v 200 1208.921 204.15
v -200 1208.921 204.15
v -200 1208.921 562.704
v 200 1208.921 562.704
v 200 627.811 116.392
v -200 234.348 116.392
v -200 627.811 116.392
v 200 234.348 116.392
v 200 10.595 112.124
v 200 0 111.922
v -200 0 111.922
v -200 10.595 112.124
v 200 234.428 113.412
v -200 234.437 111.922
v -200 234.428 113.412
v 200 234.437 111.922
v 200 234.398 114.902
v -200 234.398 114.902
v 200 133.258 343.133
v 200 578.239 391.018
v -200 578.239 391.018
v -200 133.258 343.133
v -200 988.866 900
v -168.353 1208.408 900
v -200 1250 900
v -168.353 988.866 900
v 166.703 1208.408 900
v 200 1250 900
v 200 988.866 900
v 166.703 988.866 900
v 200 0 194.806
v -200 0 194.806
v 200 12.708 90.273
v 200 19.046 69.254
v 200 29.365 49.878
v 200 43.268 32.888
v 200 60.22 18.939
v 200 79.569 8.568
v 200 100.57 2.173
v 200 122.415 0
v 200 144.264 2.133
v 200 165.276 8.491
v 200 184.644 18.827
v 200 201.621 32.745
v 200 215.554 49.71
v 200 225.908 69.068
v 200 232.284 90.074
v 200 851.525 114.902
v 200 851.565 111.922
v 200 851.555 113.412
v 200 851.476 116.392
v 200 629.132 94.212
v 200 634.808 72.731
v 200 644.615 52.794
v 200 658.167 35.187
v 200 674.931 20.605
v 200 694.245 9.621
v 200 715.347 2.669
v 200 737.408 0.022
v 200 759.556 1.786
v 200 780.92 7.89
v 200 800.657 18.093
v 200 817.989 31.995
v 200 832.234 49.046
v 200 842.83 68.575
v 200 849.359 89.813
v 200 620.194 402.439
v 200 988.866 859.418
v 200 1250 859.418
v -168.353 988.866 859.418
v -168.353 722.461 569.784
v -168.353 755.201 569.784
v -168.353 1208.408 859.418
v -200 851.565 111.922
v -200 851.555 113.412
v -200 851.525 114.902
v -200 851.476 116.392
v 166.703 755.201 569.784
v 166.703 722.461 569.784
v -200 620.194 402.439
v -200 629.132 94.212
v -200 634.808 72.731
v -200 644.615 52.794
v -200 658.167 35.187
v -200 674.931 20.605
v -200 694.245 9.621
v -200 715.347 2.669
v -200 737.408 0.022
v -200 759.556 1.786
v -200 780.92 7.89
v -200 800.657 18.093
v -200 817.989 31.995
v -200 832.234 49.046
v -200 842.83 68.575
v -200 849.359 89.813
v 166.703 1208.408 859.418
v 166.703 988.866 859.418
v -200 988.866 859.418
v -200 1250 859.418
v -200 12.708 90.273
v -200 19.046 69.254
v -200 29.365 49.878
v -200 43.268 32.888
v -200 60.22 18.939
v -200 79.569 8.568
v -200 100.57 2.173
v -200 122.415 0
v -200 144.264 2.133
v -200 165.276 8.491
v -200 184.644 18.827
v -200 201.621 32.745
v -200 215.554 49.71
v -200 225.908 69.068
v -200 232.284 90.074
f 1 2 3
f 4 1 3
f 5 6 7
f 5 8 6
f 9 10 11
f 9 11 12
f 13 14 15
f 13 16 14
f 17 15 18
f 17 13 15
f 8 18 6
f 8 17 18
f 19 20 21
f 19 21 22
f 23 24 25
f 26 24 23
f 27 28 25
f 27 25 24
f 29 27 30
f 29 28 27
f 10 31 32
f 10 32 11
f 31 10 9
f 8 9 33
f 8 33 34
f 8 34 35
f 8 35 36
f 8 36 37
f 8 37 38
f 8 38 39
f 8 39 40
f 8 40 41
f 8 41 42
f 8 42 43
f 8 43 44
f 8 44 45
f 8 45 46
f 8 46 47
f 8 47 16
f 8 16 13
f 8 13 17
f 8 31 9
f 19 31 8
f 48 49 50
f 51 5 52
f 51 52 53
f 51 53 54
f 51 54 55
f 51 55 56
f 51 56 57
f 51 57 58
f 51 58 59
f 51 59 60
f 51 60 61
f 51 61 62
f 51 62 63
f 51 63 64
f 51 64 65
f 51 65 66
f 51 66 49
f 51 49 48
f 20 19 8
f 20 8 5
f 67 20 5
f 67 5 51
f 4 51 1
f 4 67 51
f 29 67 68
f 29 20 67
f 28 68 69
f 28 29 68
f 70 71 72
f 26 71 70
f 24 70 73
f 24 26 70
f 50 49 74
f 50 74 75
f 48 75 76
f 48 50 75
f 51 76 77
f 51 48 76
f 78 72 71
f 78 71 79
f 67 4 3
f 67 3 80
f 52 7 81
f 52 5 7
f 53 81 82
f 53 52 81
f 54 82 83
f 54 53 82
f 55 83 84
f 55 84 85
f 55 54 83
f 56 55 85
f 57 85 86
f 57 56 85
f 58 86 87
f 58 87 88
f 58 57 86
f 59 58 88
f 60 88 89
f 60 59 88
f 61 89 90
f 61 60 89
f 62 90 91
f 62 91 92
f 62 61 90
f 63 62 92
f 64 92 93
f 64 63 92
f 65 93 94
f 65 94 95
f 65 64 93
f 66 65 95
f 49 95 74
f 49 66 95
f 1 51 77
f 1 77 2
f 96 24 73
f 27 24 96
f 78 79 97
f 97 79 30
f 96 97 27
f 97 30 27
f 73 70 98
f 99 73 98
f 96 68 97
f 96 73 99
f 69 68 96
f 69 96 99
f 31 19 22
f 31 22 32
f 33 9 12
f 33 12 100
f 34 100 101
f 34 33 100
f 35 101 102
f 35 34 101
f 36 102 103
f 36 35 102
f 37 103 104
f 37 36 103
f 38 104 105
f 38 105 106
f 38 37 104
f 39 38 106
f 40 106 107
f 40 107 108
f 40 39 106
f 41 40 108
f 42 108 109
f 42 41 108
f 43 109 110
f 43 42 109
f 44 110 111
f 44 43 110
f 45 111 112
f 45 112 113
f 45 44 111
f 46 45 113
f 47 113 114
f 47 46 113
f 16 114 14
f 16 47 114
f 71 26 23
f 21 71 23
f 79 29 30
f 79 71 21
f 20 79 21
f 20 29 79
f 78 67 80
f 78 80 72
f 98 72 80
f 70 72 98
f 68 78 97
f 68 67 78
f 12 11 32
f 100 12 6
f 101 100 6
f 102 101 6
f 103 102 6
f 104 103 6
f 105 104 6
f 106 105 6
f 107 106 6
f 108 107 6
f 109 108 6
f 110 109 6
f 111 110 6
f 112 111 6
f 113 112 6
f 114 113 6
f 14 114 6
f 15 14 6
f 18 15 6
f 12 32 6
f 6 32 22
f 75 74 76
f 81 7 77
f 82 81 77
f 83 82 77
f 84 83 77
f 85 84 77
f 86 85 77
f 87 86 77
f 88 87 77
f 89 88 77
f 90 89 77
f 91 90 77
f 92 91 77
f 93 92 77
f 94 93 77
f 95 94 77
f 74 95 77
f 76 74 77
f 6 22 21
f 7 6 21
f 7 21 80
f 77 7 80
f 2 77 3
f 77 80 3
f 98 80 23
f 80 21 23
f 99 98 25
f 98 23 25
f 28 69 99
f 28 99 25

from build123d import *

# Parameters (mm, degrees)
F1_DEPTH = 200
F2_W     = 335.056305
F2_H     = 699.782848
F3_DEPTH = 330.21611


with BuildPart() as f1:
    # F0 (on Right) → F1 (new body, symmetric)
    with BuildSketch(Plane.YZ):
        with BuildLine():
            ThreePointArc((851.475526, 116.391551), (739.643276, 223.843098), (627.811026, 116.391551))
            Line((627.811026, 116.391551), (851.475526, 116.391551))
        make_face()
        with BuildLine():
            ThreePointArc((10.594565, 112.123632), (122.41489, 4.6e-05), (234.437481, 111.921549))
            ThreePointArc((234.437481, 111.921549), (234.415154, 114.156996), (234.348182, 116.391551))
            Line((234.348182, 116.391551), (10.594565, 112.123632))
        make_face()
        with BuildLine():
            Line((10.594565, 112.123632), (234.348182, 116.391551))
            ThreePointArc((234.348182, 116.391551), (120.381507, 223.822743), (10.594565, 112.123632))
        make_face()
        with BuildLine():
            Line((851.475526, 116.391551), (627.811026, 116.391551))
            ThreePointArc((627.811026, 116.391551), (737.407829, 0.022327), (851.564825, 111.921549))
            ThreePointArc((851.564825, 111.921549), (851.542498, 114.156996), (851.475526, 116.391551))
        make_face()
        with BuildLine():
            ThreePointArc((10.594565, 112.123632), (120.381507, 223.822743), (234.348182, 116.391551))
            Line((234.348182, 116.391551), (627.811026, 116.391551))
            ThreePointArc((627.811026, 116.391551), (739.643276, 223.843098), (851.475526, 116.391551))
            Line((851.475526, 116.391551), (1208.921194, 204.149604))
            Line((1208.921194, 204.149604), (1208.921194, 562.703967))
            Line((1208.921194, 562.703967), (620.193636, 402.439284))
            Line((620.193636, 402.439284), (578.239322, 391.018391))
            Line((578.239322, 391.018391), (133.258164, 343.13333))
            Line((133.258164, 343.13333), (0, 194.806337))
            Line((0, 194.806337), (0, 111.921549))
            Line((0, 111.921549), (10.594565, 112.123632))
        make_face()
        Polygon((988.866329, 900), (578.239322, 391.018391), (620.193636, 402.439284), (988.866329, 859.417558), (1250, 859.417558), (1250, 900), align=None)
    extrude(amount=F1_DEPTH, both=True)

    # F2 (on face) → F3 (cut)
    with BuildSketch(Plane.XY.offset(900)):
        with Locations((-0.824928, 858.516693)):
            Rectangle(F2_W, F2_H)
    extrude(amount=-F3_DEPTH, mode=Mode.SUBTRACT)


solid = f1.part
